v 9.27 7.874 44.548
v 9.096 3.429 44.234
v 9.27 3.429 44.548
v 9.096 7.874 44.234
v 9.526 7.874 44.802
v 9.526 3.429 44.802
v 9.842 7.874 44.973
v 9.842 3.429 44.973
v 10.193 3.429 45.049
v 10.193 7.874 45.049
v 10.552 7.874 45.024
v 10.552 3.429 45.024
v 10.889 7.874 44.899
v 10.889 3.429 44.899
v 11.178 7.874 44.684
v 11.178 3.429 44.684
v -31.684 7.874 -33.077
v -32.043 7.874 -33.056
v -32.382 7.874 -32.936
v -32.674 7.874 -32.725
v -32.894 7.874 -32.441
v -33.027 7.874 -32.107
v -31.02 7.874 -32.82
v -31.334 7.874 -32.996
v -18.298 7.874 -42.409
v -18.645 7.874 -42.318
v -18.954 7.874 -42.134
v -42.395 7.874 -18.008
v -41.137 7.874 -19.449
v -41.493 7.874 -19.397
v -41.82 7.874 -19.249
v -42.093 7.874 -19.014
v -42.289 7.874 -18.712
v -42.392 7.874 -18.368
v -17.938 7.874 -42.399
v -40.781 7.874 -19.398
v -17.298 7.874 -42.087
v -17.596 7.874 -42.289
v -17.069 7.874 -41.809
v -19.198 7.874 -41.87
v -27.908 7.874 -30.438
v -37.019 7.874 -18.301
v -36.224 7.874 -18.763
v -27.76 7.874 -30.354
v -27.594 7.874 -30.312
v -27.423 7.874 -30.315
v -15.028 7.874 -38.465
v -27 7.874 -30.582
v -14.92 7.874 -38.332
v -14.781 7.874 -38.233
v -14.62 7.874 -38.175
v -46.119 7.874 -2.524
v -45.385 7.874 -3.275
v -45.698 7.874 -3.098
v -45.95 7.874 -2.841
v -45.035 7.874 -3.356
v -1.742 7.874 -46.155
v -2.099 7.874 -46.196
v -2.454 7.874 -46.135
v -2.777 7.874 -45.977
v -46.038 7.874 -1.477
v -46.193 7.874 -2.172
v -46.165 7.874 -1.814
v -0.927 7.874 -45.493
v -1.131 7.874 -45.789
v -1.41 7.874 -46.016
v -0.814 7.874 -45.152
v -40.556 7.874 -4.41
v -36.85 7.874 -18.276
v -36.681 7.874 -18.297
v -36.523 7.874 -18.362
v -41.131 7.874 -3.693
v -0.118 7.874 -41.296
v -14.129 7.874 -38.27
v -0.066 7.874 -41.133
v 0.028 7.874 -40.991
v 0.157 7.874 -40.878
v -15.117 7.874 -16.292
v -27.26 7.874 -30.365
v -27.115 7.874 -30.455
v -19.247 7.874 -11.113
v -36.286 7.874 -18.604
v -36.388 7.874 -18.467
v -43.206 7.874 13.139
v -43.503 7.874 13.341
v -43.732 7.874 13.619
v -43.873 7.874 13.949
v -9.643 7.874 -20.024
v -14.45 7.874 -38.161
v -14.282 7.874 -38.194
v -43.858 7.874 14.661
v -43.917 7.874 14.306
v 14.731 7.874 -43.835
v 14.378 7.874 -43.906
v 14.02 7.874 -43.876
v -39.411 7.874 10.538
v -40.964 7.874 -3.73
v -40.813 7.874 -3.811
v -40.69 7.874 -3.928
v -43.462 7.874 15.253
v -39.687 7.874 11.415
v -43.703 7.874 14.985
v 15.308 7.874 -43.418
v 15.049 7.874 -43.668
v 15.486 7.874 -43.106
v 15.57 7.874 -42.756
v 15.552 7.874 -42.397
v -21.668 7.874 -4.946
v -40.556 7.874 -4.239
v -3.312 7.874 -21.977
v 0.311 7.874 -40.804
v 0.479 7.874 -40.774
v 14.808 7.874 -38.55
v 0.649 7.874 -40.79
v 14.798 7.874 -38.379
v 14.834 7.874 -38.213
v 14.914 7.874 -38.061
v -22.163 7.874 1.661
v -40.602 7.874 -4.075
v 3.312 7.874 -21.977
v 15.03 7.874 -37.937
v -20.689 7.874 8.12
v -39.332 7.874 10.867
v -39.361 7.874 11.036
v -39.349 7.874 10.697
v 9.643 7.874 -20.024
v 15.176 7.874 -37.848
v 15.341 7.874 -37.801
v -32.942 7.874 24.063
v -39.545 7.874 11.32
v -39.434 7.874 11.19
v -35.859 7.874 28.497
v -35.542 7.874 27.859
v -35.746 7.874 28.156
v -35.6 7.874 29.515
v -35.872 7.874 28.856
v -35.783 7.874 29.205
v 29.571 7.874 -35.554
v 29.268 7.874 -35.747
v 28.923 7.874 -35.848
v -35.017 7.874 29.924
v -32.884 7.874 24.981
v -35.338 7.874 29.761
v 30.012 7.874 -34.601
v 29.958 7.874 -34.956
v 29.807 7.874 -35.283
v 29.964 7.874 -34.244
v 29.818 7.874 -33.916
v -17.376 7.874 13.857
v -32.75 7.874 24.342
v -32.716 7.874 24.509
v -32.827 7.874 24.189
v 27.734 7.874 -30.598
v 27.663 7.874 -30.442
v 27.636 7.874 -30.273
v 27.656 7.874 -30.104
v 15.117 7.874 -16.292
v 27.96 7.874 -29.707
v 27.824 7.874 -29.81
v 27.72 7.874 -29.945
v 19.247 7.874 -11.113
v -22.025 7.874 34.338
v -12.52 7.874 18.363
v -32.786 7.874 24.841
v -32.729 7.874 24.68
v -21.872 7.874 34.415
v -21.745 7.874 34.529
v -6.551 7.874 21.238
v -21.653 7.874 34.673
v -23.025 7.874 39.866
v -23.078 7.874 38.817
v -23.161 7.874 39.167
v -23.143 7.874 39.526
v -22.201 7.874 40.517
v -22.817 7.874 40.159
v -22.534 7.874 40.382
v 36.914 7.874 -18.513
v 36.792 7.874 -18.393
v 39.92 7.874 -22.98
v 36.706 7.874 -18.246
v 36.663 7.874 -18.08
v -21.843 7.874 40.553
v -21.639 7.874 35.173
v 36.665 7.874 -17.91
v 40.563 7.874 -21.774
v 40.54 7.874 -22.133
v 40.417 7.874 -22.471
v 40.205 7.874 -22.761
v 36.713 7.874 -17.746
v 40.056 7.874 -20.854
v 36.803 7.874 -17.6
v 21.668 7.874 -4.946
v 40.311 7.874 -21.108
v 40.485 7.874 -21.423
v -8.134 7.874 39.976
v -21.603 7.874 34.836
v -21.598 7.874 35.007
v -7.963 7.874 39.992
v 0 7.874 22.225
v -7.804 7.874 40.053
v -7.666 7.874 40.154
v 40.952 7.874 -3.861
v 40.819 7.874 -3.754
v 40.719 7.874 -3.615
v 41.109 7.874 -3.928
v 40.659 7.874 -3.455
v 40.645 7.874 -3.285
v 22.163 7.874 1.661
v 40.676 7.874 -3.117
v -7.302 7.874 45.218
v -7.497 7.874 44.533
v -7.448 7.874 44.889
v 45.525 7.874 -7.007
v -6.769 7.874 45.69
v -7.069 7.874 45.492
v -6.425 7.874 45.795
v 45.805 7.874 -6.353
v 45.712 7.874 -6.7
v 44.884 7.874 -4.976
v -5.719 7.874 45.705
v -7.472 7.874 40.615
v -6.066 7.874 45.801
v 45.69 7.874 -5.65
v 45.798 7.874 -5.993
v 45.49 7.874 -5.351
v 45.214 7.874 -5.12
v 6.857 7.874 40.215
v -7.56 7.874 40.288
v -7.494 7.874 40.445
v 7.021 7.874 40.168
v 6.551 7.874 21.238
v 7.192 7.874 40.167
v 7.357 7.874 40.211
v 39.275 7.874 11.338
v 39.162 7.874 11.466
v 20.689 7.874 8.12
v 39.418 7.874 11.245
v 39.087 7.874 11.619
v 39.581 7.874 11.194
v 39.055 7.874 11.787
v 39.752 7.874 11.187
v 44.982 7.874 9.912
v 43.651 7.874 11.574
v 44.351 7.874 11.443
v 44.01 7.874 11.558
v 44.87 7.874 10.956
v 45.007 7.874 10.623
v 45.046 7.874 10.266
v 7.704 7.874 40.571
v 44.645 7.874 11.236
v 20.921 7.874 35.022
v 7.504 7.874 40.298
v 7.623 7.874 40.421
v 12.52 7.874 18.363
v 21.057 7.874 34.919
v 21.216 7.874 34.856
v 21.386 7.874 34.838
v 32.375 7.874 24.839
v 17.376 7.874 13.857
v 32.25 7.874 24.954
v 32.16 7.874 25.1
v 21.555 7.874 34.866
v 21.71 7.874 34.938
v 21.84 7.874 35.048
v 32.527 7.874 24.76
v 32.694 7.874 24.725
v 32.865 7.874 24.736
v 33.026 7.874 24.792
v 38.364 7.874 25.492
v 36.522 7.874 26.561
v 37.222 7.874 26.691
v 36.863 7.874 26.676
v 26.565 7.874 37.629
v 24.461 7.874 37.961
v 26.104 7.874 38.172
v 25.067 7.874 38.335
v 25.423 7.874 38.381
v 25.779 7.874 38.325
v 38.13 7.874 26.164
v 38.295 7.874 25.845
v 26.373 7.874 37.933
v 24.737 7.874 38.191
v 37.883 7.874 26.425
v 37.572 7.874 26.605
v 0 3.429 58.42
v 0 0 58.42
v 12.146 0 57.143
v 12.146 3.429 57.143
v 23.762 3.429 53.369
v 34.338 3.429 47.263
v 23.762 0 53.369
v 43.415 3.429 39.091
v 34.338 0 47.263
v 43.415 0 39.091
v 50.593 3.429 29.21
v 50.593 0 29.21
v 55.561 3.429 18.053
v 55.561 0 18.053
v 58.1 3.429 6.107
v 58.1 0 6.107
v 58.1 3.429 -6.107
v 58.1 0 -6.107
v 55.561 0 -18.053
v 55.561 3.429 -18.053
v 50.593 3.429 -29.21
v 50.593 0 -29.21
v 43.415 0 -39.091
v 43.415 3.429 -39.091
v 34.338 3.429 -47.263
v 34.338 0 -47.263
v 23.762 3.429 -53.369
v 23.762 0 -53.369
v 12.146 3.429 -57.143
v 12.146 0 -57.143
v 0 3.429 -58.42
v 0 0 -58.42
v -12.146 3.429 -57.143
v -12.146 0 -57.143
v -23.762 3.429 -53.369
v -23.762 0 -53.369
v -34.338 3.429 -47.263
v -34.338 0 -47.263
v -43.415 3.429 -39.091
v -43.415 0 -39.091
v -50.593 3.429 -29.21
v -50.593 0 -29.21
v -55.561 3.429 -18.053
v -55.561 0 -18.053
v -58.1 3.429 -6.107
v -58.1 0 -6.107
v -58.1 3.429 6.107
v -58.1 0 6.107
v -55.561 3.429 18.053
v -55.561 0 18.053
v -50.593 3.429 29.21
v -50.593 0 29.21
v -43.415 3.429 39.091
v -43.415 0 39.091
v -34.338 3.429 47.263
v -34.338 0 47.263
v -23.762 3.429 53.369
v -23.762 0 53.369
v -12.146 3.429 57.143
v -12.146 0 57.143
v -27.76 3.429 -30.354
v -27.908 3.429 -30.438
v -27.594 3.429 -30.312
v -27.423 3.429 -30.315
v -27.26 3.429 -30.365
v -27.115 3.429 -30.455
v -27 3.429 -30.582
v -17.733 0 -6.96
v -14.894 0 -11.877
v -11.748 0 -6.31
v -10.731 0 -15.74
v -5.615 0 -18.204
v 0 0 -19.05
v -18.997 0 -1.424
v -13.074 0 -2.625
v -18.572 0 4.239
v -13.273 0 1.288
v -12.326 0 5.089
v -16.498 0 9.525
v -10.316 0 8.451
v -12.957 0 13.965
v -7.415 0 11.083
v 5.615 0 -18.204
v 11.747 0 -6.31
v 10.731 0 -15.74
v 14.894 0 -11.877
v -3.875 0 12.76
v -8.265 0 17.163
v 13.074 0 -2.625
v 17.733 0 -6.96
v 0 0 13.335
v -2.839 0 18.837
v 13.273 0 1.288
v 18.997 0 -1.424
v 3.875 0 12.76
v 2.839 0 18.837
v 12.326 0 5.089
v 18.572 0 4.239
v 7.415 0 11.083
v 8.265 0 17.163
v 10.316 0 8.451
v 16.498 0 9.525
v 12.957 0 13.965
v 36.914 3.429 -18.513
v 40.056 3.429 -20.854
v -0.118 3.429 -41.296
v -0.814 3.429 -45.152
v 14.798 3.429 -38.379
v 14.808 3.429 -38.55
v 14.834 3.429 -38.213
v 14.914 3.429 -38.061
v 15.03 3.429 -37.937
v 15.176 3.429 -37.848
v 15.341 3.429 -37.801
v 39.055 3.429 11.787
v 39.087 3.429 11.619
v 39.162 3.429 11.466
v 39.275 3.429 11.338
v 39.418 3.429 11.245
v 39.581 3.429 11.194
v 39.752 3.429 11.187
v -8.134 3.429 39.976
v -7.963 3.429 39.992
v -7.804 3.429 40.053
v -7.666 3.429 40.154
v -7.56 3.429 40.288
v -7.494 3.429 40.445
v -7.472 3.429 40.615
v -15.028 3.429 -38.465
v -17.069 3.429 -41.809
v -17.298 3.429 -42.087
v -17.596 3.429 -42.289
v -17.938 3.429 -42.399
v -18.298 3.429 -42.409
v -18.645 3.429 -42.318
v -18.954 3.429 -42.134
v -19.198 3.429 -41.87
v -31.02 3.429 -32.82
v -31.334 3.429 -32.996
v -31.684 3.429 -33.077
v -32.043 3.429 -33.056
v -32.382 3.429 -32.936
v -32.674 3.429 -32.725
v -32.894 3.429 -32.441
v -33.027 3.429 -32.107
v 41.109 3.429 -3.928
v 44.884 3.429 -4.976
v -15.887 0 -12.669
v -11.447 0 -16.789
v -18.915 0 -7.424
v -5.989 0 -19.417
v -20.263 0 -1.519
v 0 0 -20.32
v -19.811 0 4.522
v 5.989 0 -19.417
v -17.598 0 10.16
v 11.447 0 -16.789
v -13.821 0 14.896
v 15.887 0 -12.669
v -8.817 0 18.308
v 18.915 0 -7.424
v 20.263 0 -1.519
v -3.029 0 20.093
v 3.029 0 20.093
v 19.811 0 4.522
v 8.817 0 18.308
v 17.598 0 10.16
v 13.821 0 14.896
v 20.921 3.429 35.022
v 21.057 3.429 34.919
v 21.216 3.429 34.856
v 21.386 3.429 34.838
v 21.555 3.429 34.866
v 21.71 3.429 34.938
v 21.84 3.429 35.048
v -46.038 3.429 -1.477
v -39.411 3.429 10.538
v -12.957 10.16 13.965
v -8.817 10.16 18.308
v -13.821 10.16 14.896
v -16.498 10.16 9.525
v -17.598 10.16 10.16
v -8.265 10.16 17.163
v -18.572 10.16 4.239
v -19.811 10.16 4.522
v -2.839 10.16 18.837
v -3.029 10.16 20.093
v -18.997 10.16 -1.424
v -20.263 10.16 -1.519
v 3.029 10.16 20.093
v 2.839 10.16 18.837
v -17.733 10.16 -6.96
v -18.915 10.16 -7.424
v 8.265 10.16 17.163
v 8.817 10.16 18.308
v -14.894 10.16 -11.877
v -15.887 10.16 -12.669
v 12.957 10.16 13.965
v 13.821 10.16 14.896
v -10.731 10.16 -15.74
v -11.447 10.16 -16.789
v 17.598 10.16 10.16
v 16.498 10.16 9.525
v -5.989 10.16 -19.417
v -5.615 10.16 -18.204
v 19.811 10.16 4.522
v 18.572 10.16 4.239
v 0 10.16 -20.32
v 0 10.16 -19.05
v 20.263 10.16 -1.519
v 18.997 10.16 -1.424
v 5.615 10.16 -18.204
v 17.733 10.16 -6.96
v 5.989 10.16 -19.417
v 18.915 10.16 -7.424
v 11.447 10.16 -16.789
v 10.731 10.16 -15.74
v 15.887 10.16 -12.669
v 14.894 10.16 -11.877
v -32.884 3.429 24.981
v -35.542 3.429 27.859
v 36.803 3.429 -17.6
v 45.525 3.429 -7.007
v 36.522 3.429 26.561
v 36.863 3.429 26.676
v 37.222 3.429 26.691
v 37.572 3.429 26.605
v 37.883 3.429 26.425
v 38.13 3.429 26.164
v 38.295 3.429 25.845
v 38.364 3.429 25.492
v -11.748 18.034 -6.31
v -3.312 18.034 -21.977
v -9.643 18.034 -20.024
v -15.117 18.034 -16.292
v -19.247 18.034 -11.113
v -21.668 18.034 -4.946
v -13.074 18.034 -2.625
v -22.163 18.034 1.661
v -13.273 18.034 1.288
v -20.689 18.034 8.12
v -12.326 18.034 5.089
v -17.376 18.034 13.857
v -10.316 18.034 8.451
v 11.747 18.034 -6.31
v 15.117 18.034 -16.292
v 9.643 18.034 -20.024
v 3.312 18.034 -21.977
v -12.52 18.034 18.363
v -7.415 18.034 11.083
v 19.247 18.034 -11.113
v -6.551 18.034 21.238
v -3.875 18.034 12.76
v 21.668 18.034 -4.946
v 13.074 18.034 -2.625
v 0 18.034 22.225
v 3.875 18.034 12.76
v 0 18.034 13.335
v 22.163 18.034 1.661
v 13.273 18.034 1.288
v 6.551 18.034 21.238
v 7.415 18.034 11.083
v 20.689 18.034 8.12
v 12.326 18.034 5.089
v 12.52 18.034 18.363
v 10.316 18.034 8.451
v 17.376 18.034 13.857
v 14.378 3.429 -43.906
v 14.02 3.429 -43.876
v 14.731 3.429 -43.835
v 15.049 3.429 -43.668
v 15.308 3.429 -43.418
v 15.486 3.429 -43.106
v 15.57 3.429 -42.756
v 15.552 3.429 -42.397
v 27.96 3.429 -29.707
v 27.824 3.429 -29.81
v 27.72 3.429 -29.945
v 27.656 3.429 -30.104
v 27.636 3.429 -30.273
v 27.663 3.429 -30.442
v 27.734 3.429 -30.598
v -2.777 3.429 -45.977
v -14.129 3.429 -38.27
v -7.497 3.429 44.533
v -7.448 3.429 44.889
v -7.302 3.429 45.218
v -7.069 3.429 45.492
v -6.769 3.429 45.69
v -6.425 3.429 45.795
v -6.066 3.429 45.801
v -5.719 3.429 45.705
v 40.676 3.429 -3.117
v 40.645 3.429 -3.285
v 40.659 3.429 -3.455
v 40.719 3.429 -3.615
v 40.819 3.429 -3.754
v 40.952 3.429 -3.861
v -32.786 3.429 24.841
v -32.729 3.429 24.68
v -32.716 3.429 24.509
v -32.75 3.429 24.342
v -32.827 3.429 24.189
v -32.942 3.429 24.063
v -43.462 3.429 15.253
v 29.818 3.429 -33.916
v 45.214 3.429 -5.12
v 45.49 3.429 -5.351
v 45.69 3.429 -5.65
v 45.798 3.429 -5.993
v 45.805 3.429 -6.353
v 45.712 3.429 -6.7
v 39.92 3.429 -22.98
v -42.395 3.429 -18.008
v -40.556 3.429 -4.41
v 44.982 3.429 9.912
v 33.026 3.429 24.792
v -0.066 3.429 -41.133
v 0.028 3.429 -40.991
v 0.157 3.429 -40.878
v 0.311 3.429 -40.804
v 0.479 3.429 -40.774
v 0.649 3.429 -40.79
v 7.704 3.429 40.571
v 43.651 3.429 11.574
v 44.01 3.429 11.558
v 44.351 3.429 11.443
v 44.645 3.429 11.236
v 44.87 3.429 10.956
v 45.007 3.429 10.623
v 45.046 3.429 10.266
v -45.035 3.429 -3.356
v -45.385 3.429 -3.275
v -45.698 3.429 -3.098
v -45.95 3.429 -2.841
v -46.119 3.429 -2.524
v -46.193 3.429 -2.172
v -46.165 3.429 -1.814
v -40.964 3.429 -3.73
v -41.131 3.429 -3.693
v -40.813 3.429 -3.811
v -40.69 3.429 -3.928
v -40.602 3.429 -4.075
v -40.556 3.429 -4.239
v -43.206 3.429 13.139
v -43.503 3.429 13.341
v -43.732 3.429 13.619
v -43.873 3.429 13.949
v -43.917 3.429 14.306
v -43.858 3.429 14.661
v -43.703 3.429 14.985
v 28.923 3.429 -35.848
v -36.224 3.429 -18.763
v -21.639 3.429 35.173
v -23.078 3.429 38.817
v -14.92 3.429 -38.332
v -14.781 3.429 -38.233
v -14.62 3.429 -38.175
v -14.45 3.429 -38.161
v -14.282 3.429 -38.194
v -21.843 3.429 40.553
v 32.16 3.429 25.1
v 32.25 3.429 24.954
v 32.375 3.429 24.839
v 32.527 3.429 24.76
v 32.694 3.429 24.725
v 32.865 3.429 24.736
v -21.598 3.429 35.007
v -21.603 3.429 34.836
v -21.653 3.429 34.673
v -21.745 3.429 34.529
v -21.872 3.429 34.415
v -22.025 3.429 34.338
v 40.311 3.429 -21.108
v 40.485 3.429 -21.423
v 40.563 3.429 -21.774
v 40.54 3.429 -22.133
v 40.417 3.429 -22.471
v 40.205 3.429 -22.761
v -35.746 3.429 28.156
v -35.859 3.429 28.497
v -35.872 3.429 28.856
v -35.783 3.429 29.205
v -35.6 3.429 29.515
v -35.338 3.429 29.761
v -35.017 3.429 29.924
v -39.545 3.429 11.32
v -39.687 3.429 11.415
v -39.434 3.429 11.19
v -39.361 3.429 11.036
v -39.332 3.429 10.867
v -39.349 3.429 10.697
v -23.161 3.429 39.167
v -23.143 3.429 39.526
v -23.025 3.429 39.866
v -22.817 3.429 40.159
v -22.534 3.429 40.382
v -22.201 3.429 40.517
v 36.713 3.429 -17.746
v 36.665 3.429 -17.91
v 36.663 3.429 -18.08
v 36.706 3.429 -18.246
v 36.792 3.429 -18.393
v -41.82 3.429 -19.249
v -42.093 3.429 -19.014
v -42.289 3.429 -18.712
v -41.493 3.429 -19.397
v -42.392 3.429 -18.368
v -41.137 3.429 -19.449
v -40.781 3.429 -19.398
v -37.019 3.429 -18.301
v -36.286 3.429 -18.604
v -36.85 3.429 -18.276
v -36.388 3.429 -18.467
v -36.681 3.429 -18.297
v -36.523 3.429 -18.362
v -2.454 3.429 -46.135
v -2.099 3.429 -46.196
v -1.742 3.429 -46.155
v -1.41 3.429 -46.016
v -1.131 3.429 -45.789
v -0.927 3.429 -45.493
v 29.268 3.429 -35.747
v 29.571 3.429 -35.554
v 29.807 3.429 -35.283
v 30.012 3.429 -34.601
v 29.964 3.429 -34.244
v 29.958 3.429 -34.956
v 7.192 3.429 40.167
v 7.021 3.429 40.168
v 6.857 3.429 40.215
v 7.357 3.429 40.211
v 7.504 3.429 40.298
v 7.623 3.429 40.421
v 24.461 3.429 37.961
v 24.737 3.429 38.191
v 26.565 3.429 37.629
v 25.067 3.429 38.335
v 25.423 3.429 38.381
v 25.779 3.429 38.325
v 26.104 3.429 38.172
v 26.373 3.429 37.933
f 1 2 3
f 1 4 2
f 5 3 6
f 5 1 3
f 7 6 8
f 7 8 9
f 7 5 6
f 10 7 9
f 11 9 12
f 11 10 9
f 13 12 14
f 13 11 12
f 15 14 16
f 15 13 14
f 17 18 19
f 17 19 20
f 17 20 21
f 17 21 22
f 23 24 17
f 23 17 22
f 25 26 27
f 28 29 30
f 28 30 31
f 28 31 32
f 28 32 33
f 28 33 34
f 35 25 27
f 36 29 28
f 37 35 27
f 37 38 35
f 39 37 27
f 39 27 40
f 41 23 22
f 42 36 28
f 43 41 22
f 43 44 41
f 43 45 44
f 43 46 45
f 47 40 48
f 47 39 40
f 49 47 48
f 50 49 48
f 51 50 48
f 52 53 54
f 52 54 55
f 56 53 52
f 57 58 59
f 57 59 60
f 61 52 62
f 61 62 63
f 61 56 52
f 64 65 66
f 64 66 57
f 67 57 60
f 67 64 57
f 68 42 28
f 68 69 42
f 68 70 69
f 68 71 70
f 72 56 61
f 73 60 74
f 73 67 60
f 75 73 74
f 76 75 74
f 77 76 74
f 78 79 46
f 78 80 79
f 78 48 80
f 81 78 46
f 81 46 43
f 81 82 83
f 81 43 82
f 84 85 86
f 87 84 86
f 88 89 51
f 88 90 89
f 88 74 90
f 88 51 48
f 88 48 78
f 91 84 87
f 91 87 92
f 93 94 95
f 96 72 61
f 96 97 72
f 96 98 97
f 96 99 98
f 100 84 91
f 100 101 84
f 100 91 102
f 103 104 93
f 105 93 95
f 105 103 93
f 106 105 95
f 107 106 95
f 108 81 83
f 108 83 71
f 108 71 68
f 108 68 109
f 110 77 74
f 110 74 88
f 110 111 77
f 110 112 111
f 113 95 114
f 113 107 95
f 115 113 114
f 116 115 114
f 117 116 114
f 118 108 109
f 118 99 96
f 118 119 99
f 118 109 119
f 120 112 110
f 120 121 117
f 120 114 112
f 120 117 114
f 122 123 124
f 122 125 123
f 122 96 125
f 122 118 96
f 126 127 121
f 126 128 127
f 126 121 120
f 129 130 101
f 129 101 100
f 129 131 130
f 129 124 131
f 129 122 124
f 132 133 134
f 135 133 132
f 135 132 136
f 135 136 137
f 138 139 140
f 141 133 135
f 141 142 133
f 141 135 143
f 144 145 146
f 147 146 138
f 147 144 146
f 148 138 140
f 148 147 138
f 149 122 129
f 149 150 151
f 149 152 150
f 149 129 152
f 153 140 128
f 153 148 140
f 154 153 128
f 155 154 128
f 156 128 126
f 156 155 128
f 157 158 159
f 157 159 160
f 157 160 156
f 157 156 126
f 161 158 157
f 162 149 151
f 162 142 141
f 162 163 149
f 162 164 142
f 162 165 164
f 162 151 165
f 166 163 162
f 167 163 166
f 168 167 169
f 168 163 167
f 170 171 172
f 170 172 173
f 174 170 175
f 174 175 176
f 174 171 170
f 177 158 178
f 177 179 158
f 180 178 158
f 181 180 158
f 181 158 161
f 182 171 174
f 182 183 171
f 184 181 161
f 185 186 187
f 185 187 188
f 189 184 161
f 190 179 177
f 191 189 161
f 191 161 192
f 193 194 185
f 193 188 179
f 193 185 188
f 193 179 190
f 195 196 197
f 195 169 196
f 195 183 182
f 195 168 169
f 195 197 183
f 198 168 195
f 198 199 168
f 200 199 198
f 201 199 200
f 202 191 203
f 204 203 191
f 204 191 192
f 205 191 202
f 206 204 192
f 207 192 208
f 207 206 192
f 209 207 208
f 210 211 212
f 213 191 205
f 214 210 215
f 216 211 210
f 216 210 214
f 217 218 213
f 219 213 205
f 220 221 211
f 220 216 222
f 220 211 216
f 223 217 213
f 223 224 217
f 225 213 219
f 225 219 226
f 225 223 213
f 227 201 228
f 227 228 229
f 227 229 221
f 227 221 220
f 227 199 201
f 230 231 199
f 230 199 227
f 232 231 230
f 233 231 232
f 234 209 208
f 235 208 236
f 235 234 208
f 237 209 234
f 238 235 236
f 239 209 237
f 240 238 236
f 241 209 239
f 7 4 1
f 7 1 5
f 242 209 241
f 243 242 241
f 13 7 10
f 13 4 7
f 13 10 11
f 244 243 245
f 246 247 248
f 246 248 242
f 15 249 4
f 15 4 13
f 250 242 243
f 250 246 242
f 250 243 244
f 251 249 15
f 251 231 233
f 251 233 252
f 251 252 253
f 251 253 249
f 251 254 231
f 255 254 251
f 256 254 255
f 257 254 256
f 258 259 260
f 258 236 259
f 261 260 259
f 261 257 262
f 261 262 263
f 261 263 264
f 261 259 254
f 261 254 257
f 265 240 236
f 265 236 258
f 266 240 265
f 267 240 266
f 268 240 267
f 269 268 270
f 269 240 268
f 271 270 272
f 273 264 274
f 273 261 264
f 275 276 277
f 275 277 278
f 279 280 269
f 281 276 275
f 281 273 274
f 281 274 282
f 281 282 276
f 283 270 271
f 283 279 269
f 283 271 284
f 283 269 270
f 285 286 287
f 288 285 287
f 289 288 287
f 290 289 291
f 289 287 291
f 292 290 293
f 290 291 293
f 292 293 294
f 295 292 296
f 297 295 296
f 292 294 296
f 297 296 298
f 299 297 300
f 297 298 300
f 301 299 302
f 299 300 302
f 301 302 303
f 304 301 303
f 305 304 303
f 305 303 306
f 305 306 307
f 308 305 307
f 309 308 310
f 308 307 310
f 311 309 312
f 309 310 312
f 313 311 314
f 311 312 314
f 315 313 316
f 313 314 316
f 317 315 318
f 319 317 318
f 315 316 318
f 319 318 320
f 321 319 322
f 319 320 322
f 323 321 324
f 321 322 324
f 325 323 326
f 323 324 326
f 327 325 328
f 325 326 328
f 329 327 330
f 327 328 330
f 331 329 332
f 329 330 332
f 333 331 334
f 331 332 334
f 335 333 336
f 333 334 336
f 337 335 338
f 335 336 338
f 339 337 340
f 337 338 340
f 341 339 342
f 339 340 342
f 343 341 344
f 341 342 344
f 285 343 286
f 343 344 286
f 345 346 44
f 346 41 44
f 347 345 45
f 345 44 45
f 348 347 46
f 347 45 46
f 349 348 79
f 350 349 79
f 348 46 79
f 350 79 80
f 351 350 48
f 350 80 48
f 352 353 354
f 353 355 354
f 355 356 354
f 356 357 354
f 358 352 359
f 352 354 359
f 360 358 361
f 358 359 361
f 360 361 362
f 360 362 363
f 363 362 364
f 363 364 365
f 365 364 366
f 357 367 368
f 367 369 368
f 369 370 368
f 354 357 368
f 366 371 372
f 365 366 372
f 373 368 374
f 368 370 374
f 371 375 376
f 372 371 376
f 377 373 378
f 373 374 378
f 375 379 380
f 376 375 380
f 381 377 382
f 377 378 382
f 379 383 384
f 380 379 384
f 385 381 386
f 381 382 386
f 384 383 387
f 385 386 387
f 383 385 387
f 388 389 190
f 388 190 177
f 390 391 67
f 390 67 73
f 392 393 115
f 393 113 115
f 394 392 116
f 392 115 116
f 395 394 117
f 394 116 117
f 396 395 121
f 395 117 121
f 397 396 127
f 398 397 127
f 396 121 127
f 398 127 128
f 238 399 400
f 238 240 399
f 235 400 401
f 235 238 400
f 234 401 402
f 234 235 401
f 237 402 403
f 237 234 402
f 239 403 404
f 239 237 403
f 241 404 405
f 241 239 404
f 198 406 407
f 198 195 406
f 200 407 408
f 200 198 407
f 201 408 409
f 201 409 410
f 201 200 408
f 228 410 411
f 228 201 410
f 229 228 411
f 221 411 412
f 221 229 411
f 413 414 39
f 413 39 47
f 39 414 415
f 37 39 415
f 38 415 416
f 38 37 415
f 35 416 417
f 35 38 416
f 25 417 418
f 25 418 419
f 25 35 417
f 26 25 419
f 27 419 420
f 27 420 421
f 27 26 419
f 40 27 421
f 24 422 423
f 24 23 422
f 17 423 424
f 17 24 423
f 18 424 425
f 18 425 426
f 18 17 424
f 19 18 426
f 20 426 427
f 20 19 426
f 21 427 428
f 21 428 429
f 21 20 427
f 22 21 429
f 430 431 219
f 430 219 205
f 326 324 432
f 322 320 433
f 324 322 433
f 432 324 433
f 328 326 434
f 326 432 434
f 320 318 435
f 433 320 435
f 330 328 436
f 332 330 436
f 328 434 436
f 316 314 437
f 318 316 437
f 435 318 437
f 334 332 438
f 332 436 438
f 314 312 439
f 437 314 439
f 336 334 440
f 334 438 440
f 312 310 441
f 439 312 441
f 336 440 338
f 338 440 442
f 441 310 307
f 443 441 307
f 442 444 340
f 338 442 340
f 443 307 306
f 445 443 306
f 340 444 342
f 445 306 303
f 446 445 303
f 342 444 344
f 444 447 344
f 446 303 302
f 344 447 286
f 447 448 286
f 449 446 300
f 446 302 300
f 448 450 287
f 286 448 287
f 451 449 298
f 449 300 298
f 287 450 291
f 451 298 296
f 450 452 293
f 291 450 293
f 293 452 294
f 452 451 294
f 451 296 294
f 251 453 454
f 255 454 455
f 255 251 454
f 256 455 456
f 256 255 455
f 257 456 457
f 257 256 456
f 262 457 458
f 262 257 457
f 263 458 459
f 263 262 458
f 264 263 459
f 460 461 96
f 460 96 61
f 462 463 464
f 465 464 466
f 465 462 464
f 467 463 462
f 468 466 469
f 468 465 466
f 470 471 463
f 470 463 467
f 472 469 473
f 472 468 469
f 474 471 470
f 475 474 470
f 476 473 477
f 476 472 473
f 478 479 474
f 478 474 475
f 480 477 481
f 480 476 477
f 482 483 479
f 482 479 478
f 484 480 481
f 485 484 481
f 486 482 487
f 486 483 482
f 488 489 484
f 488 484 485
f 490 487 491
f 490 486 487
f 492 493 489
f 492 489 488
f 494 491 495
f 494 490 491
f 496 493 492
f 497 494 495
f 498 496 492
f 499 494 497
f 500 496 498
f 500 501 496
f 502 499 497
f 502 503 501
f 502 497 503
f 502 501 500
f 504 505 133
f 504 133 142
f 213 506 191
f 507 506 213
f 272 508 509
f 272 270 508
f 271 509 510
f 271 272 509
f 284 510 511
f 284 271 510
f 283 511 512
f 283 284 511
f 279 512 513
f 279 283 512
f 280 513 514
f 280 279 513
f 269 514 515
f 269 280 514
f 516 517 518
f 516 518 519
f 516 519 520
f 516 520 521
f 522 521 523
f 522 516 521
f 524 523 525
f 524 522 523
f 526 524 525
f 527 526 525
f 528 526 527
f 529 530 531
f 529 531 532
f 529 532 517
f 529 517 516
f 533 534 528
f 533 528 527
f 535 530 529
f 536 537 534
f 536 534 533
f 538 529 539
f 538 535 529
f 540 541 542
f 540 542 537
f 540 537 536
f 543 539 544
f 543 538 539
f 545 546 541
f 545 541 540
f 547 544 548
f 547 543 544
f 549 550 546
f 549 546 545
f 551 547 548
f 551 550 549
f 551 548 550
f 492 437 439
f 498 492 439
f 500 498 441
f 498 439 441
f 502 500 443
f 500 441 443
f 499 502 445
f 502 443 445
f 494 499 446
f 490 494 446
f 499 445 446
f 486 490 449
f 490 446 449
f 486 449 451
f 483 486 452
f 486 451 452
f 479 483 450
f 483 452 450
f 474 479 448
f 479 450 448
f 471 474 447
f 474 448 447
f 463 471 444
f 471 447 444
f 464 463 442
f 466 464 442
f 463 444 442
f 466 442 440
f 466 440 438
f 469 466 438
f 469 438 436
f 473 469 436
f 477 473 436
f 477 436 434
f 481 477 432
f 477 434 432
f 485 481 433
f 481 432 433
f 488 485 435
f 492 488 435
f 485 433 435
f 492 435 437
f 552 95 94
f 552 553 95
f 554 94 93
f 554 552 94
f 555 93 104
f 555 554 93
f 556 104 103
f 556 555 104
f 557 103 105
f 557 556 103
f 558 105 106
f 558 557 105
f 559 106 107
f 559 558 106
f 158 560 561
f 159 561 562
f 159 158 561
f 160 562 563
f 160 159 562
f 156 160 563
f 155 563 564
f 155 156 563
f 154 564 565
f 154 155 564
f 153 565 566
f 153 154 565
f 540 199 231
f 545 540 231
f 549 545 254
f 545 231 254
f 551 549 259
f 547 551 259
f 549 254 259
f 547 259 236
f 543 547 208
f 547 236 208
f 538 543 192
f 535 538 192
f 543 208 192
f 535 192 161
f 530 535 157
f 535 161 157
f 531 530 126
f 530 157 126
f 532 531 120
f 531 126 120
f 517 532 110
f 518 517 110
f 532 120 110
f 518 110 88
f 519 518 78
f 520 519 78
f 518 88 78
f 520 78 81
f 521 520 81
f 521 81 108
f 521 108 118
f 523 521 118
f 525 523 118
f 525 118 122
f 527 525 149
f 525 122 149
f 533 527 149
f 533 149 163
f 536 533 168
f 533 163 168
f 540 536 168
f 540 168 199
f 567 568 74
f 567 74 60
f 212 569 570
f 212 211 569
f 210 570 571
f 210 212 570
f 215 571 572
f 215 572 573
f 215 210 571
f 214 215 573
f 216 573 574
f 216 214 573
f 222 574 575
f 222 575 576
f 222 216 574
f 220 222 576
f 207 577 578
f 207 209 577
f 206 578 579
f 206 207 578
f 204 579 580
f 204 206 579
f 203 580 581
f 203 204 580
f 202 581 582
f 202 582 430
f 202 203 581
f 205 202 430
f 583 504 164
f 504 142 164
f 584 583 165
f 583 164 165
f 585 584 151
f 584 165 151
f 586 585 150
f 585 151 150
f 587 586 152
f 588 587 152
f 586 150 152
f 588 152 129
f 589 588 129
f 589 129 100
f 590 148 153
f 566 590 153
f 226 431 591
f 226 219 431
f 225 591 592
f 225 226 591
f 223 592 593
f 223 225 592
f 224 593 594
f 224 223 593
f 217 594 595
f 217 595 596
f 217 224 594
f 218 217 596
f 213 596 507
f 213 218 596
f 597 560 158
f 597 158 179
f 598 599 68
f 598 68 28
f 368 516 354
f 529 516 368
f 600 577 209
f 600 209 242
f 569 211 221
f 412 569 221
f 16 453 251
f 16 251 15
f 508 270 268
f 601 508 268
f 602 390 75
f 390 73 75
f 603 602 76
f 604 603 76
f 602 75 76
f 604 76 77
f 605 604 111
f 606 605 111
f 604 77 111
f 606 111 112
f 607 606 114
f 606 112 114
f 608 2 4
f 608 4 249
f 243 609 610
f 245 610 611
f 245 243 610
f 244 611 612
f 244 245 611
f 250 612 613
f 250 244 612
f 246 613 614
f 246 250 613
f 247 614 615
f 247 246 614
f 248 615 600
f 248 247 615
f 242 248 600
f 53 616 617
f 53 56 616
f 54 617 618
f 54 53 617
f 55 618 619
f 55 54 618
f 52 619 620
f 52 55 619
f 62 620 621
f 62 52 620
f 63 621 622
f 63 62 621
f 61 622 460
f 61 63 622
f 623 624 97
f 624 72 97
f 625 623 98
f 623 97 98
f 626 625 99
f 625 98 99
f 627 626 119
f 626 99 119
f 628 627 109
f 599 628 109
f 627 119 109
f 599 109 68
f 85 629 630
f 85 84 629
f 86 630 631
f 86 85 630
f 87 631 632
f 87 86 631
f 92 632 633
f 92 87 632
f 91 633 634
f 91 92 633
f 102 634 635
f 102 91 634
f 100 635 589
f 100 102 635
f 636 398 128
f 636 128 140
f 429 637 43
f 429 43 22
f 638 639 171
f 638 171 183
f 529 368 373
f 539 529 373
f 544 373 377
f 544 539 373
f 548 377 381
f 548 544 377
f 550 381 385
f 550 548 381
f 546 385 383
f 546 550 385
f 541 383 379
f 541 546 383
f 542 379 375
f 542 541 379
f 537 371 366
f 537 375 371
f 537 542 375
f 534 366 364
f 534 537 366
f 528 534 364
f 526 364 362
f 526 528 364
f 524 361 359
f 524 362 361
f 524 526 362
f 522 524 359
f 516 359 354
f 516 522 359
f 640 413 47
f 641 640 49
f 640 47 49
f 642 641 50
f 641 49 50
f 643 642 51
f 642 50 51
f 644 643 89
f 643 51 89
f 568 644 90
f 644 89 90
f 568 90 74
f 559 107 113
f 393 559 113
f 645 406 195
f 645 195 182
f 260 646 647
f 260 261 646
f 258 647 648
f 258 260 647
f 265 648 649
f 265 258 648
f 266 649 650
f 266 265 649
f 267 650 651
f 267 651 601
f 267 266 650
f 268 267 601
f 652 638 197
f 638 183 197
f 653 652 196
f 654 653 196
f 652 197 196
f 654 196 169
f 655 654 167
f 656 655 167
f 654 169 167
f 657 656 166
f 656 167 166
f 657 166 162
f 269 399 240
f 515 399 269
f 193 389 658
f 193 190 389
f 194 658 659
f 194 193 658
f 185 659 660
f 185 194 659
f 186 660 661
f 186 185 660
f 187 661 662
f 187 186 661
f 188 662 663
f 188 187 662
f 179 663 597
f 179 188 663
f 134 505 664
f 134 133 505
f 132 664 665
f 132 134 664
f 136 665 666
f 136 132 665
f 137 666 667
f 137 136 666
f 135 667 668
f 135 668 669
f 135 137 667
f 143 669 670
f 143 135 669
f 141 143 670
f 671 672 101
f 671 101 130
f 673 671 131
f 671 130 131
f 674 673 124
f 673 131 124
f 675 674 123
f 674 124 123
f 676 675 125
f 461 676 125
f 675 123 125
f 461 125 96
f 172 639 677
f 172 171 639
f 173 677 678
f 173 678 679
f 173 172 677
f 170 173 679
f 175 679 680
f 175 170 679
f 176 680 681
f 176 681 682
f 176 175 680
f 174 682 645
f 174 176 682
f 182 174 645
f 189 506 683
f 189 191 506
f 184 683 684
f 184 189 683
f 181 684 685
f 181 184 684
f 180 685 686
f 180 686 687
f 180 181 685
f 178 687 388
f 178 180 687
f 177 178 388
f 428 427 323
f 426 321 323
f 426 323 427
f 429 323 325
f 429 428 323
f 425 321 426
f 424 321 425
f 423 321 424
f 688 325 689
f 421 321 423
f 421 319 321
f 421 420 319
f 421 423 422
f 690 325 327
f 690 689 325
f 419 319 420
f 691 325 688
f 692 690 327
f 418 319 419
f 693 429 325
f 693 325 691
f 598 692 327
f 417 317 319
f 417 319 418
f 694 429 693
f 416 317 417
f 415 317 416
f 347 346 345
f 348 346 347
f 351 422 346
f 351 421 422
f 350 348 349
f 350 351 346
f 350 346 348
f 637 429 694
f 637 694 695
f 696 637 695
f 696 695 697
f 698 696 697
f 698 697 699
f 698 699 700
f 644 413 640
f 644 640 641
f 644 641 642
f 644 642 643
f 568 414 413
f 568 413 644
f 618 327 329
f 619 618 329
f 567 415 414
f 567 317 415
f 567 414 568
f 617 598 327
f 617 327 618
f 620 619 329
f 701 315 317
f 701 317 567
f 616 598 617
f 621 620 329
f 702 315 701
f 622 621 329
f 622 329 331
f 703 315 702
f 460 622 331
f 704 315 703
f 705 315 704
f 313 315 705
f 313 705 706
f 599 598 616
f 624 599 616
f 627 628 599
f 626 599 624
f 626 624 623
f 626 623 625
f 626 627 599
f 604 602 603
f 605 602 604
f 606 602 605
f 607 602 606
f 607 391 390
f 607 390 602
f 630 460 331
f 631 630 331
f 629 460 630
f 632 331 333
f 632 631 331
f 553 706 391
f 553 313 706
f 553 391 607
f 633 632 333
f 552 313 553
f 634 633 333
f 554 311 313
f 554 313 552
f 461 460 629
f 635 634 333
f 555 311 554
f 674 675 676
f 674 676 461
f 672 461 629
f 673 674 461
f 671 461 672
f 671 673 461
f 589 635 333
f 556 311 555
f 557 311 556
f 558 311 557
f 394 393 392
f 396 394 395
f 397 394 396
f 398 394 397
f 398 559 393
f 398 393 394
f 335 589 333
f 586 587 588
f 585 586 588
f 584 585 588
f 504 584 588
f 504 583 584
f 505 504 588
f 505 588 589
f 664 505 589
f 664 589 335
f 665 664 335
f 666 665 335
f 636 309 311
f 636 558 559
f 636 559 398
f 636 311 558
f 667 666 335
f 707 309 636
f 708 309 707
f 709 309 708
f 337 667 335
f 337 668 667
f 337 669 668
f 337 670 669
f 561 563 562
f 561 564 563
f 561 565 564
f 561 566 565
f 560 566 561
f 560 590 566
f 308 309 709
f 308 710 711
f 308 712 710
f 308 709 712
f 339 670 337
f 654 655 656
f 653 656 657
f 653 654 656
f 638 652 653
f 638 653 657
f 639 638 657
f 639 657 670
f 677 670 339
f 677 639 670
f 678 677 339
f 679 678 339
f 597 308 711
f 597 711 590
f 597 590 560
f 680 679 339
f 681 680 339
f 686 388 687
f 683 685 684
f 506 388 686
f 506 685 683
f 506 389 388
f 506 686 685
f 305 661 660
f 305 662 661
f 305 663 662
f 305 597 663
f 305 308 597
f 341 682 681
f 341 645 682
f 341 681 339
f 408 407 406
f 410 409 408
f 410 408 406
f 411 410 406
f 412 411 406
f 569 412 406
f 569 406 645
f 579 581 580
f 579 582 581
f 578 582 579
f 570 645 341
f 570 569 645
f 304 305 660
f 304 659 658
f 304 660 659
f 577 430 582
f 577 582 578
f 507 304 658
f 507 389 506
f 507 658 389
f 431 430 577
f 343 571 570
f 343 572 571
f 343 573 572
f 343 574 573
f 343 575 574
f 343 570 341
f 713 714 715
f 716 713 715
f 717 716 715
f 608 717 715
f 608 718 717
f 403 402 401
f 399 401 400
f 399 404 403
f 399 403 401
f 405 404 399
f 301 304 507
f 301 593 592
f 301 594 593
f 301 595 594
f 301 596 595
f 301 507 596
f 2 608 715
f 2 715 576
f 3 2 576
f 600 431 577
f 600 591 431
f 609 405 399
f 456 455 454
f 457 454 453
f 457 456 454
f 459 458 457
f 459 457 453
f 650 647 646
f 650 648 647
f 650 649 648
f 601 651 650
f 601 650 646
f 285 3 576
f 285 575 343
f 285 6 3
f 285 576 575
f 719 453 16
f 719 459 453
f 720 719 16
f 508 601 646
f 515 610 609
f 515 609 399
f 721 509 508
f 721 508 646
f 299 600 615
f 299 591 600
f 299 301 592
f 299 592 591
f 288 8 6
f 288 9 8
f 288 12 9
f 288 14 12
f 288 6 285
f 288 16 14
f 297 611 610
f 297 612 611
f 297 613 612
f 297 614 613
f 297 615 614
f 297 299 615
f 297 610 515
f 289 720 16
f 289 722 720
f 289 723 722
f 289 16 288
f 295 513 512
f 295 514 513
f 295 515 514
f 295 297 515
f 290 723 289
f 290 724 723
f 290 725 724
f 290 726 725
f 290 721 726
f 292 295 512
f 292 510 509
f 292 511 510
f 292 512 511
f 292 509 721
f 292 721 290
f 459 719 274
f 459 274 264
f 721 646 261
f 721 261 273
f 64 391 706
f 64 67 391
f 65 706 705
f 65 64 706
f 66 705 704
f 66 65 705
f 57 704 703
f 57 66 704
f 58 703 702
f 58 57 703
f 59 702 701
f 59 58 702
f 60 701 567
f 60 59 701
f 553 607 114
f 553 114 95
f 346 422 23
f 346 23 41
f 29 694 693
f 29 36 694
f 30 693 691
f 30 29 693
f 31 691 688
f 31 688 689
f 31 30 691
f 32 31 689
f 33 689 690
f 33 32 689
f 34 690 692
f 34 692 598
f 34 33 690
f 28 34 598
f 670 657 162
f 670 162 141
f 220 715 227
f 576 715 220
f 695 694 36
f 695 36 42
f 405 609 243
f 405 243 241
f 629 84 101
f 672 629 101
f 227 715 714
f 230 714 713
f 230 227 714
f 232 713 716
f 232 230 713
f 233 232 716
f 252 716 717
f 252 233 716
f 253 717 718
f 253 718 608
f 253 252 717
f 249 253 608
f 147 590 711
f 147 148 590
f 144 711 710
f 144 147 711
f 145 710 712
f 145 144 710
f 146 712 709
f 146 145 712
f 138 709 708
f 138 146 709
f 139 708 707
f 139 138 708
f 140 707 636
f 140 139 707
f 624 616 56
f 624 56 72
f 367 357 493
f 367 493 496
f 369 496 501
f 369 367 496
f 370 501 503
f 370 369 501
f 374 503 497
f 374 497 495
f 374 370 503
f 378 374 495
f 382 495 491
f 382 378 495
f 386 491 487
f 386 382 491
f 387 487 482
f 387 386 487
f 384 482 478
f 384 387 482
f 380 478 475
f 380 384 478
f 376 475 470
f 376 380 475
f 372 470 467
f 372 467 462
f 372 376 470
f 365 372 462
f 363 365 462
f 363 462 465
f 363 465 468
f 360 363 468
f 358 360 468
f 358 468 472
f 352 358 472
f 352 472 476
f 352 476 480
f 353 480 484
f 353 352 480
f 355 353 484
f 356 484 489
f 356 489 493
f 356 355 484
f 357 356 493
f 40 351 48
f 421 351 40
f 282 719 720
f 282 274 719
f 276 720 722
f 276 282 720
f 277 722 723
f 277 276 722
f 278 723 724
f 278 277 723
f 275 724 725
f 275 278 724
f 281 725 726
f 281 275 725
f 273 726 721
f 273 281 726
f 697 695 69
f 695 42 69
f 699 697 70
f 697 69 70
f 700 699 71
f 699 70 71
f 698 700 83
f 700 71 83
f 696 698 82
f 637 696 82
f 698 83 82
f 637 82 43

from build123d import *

# Parameters (mm, degrees)
SKETCH1_R           = 58.42
BOSS_EXTRUDE1_DEPTH = 3.429
SKETCH2_R           = 47.700633093
BOSS_EXTRUDE3_DEPTH = 4.445
CUT_EXTRUDE2_START  = -4.445
CUT_EXTRUDE2_DEPTH  = 4.445
CIRPATTERN1_COUNT   = 17
FILLET1_R           = 1.27
FILLET2_R           = 0.635
SKETCH5_R           = 22.225
BOSS_EXTRUDE4_DEPTH = 10.16
CUT_EXTRUDE3_DEPTH  = 85.563691712
SKETCH7_R           = 20.32
SKETCH7_R_2         = 19.05
CUT_EXTRUDE4_DEPTH  = 10.16


with BuildPart() as part:
    # Sketch1 → Boss-Extrude1 (new body)
    with BuildSketch(Plane(origin=(0, 0, 0), x_dir=(1, 0, 0), z_dir=(0, 1, 0))):
        with Locations(Location((0, 0, 0), (0, 0, 270))):
            Circle(SKETCH1_R)
    extrude(amount=BOSS_EXTRUDE1_DEPTH)

    # Sketch2 → Boss-Extrude3 (add)
    with BuildSketch(Plane(origin=(0, 3.429, 0), x_dir=(1, 0, 0), z_dir=(0, 1, 0))):
        with Locations(Location((0, 0, 0), (0, 0, 270))):
            Circle(SKETCH2_R)
    extrude(amount=BOSS_EXTRUDE3_DEPTH)

    # Sketch4 → Cut-Extrude2 (cut)
    with BuildSketch(Plane(origin=(0, 7.874, 0), x_dir=(1, 0, 0), z_dir=(0, 1, 0)).offset(CUT_EXTRUDE2_START)):
        with BuildLine():
            Line((-1.27, 47.683723612), (0, 40.64))
            Line((0, 40.64), (17.007917051, 44.565470435))
            ThreePointArc((17.007917051, 44.565470435), (8.021931438, 47.021261292), (-1.27, 47.683723612))
        make_face()
    cut_extrude2 = extrude(amount=CUT_EXTRUDE2_DEPTH, mode=Mode.SUBTRACT)

    # CirPattern1: Cut-Extrude2 ×17 about axis
    cirpattern1_axis = Axis((0, 0, 0), (0, 1, 0))
    for i in range(1, CIRPATTERN1_COUNT):
        add(cut_extrude2.rotate(cirpattern1_axis, i * 360 / CIRPATTERN1_COUNT), mode=Mode.SUBTRACT)

    # Fillet1
    fillet1_edges = [part.edges().sort_by_distance(p)[0] for p in [
        (-1.160233877, 5.6515, -47.07493445),
        (15.923541887, 5.6515, -44.315193895),
        (-18.087313626, 5.6515, -43.476944257),
        (-32.571601445, 5.6515, -34.007151828),
        (-42.656914003, 5.6515, -19.944505104),
        (-46.981173955, 5.6515, -3.18824245),
        (-44.960366033, 5.6515, 13.998610014),
        (-36.867411544, 5.6515, 29.294872626),
        (-23.795308837, 5.6515, 40.634700362),
        (-7.509517816, 5.6515, 46.486586649),
        (9.790475196, 5.6515, 46.060201819),
        (25.768210283, 5.6515, 39.413131504),
        (38.265805785, 5.6515, 27.443099384),
        (45.595392177, 5.6515, 11.766724625),
        (46.767068202, 5.6515, -5.498811497),
        (41.622592522, 5.6515, -22.021702656),
        (30.856755083, 5.6515, -35.570440844),
    ]]
    fillet(fillet1_edges, radius=FILLET1_R)

    # Fillet2
    fillet2_edges = [part.edges().sort_by_distance(p)[0] for p in [
        (0, 5.6515, -40.64),
        (14.680861314, 5.6515, -37.895671403),
        (-14.680861314, 5.6515, -37.895671403),
        (-27.378990958, 5.6515, -30.033322396),
        (-36.379436161, 5.6515, -18.114806779),
        (-40.466636925, 5.6515, -3.749786129),
        (-39.088594139, 5.6515, 11.121663917),
        (-32.431420117, 5.6515, 24.491071622),
        (-21.394203099, 5.6515, 34.552824396),
        (-7.467580404, 5.6515, 39.948026771),
        (7.467580404, 5.6515, 39.948026771),
        (21.394203099, 5.6515, 34.552824396),
        (32.431420117, 5.6515, 24.491071622),
        (39.088594139, 5.6515, 11.121663917),
        (40.466636925, 5.6515, -3.749786129),
        (36.379436161, 5.6515, -18.114806779),
        (27.378990958, 5.6515, -30.033322396),
    ]]
    fillet(fillet2_edges, radius=FILLET2_R)

    # Sketch5 → Boss-Extrude4 (add)
    with BuildSketch(Plane(origin=(0, 7.874, 0), x_dir=(1, 0, 0), z_dir=(0, 1, 0))):
        with Locations(Location((0, 0, 0), (0, 0, 270))):
            Circle(SKETCH5_R)
    extrude(amount=BOSS_EXTRUDE4_DEPTH)

    # Sketch6 → Cut-Extrude3 (cut, through all)
    with BuildSketch(Plane(origin=(0, 18.034, 0), x_dir=(1, 0, 0), z_dir=(0, 1, 0))):
        with BuildLine():
            Line((-11.7475, 6.310187695), (11.7475, 6.310187695))
            ThreePointArc((11.7475, 6.310187695), (0, -13.335), (-11.7475, 6.310187695))
        make_face()
    extrude(amount=-CUT_EXTRUDE3_DEPTH, mode=Mode.SUBTRACT)

    # Sketch7 → Cut-Extrude4 (cut)
    with BuildSketch(Plane.XZ):
        with Locations(Location((0, 0, 0), (0, 0, 270))):
            Circle(SKETCH7_R)
        with Locations(Location((0, 0, 0), (0, 0, 270))):
            Circle(SKETCH7_R_2, mode=Mode.SUBTRACT)
    extrude(amount=-CUT_EXTRUDE4_DEPTH, mode=Mode.SUBTRACT)


solid = part.part
